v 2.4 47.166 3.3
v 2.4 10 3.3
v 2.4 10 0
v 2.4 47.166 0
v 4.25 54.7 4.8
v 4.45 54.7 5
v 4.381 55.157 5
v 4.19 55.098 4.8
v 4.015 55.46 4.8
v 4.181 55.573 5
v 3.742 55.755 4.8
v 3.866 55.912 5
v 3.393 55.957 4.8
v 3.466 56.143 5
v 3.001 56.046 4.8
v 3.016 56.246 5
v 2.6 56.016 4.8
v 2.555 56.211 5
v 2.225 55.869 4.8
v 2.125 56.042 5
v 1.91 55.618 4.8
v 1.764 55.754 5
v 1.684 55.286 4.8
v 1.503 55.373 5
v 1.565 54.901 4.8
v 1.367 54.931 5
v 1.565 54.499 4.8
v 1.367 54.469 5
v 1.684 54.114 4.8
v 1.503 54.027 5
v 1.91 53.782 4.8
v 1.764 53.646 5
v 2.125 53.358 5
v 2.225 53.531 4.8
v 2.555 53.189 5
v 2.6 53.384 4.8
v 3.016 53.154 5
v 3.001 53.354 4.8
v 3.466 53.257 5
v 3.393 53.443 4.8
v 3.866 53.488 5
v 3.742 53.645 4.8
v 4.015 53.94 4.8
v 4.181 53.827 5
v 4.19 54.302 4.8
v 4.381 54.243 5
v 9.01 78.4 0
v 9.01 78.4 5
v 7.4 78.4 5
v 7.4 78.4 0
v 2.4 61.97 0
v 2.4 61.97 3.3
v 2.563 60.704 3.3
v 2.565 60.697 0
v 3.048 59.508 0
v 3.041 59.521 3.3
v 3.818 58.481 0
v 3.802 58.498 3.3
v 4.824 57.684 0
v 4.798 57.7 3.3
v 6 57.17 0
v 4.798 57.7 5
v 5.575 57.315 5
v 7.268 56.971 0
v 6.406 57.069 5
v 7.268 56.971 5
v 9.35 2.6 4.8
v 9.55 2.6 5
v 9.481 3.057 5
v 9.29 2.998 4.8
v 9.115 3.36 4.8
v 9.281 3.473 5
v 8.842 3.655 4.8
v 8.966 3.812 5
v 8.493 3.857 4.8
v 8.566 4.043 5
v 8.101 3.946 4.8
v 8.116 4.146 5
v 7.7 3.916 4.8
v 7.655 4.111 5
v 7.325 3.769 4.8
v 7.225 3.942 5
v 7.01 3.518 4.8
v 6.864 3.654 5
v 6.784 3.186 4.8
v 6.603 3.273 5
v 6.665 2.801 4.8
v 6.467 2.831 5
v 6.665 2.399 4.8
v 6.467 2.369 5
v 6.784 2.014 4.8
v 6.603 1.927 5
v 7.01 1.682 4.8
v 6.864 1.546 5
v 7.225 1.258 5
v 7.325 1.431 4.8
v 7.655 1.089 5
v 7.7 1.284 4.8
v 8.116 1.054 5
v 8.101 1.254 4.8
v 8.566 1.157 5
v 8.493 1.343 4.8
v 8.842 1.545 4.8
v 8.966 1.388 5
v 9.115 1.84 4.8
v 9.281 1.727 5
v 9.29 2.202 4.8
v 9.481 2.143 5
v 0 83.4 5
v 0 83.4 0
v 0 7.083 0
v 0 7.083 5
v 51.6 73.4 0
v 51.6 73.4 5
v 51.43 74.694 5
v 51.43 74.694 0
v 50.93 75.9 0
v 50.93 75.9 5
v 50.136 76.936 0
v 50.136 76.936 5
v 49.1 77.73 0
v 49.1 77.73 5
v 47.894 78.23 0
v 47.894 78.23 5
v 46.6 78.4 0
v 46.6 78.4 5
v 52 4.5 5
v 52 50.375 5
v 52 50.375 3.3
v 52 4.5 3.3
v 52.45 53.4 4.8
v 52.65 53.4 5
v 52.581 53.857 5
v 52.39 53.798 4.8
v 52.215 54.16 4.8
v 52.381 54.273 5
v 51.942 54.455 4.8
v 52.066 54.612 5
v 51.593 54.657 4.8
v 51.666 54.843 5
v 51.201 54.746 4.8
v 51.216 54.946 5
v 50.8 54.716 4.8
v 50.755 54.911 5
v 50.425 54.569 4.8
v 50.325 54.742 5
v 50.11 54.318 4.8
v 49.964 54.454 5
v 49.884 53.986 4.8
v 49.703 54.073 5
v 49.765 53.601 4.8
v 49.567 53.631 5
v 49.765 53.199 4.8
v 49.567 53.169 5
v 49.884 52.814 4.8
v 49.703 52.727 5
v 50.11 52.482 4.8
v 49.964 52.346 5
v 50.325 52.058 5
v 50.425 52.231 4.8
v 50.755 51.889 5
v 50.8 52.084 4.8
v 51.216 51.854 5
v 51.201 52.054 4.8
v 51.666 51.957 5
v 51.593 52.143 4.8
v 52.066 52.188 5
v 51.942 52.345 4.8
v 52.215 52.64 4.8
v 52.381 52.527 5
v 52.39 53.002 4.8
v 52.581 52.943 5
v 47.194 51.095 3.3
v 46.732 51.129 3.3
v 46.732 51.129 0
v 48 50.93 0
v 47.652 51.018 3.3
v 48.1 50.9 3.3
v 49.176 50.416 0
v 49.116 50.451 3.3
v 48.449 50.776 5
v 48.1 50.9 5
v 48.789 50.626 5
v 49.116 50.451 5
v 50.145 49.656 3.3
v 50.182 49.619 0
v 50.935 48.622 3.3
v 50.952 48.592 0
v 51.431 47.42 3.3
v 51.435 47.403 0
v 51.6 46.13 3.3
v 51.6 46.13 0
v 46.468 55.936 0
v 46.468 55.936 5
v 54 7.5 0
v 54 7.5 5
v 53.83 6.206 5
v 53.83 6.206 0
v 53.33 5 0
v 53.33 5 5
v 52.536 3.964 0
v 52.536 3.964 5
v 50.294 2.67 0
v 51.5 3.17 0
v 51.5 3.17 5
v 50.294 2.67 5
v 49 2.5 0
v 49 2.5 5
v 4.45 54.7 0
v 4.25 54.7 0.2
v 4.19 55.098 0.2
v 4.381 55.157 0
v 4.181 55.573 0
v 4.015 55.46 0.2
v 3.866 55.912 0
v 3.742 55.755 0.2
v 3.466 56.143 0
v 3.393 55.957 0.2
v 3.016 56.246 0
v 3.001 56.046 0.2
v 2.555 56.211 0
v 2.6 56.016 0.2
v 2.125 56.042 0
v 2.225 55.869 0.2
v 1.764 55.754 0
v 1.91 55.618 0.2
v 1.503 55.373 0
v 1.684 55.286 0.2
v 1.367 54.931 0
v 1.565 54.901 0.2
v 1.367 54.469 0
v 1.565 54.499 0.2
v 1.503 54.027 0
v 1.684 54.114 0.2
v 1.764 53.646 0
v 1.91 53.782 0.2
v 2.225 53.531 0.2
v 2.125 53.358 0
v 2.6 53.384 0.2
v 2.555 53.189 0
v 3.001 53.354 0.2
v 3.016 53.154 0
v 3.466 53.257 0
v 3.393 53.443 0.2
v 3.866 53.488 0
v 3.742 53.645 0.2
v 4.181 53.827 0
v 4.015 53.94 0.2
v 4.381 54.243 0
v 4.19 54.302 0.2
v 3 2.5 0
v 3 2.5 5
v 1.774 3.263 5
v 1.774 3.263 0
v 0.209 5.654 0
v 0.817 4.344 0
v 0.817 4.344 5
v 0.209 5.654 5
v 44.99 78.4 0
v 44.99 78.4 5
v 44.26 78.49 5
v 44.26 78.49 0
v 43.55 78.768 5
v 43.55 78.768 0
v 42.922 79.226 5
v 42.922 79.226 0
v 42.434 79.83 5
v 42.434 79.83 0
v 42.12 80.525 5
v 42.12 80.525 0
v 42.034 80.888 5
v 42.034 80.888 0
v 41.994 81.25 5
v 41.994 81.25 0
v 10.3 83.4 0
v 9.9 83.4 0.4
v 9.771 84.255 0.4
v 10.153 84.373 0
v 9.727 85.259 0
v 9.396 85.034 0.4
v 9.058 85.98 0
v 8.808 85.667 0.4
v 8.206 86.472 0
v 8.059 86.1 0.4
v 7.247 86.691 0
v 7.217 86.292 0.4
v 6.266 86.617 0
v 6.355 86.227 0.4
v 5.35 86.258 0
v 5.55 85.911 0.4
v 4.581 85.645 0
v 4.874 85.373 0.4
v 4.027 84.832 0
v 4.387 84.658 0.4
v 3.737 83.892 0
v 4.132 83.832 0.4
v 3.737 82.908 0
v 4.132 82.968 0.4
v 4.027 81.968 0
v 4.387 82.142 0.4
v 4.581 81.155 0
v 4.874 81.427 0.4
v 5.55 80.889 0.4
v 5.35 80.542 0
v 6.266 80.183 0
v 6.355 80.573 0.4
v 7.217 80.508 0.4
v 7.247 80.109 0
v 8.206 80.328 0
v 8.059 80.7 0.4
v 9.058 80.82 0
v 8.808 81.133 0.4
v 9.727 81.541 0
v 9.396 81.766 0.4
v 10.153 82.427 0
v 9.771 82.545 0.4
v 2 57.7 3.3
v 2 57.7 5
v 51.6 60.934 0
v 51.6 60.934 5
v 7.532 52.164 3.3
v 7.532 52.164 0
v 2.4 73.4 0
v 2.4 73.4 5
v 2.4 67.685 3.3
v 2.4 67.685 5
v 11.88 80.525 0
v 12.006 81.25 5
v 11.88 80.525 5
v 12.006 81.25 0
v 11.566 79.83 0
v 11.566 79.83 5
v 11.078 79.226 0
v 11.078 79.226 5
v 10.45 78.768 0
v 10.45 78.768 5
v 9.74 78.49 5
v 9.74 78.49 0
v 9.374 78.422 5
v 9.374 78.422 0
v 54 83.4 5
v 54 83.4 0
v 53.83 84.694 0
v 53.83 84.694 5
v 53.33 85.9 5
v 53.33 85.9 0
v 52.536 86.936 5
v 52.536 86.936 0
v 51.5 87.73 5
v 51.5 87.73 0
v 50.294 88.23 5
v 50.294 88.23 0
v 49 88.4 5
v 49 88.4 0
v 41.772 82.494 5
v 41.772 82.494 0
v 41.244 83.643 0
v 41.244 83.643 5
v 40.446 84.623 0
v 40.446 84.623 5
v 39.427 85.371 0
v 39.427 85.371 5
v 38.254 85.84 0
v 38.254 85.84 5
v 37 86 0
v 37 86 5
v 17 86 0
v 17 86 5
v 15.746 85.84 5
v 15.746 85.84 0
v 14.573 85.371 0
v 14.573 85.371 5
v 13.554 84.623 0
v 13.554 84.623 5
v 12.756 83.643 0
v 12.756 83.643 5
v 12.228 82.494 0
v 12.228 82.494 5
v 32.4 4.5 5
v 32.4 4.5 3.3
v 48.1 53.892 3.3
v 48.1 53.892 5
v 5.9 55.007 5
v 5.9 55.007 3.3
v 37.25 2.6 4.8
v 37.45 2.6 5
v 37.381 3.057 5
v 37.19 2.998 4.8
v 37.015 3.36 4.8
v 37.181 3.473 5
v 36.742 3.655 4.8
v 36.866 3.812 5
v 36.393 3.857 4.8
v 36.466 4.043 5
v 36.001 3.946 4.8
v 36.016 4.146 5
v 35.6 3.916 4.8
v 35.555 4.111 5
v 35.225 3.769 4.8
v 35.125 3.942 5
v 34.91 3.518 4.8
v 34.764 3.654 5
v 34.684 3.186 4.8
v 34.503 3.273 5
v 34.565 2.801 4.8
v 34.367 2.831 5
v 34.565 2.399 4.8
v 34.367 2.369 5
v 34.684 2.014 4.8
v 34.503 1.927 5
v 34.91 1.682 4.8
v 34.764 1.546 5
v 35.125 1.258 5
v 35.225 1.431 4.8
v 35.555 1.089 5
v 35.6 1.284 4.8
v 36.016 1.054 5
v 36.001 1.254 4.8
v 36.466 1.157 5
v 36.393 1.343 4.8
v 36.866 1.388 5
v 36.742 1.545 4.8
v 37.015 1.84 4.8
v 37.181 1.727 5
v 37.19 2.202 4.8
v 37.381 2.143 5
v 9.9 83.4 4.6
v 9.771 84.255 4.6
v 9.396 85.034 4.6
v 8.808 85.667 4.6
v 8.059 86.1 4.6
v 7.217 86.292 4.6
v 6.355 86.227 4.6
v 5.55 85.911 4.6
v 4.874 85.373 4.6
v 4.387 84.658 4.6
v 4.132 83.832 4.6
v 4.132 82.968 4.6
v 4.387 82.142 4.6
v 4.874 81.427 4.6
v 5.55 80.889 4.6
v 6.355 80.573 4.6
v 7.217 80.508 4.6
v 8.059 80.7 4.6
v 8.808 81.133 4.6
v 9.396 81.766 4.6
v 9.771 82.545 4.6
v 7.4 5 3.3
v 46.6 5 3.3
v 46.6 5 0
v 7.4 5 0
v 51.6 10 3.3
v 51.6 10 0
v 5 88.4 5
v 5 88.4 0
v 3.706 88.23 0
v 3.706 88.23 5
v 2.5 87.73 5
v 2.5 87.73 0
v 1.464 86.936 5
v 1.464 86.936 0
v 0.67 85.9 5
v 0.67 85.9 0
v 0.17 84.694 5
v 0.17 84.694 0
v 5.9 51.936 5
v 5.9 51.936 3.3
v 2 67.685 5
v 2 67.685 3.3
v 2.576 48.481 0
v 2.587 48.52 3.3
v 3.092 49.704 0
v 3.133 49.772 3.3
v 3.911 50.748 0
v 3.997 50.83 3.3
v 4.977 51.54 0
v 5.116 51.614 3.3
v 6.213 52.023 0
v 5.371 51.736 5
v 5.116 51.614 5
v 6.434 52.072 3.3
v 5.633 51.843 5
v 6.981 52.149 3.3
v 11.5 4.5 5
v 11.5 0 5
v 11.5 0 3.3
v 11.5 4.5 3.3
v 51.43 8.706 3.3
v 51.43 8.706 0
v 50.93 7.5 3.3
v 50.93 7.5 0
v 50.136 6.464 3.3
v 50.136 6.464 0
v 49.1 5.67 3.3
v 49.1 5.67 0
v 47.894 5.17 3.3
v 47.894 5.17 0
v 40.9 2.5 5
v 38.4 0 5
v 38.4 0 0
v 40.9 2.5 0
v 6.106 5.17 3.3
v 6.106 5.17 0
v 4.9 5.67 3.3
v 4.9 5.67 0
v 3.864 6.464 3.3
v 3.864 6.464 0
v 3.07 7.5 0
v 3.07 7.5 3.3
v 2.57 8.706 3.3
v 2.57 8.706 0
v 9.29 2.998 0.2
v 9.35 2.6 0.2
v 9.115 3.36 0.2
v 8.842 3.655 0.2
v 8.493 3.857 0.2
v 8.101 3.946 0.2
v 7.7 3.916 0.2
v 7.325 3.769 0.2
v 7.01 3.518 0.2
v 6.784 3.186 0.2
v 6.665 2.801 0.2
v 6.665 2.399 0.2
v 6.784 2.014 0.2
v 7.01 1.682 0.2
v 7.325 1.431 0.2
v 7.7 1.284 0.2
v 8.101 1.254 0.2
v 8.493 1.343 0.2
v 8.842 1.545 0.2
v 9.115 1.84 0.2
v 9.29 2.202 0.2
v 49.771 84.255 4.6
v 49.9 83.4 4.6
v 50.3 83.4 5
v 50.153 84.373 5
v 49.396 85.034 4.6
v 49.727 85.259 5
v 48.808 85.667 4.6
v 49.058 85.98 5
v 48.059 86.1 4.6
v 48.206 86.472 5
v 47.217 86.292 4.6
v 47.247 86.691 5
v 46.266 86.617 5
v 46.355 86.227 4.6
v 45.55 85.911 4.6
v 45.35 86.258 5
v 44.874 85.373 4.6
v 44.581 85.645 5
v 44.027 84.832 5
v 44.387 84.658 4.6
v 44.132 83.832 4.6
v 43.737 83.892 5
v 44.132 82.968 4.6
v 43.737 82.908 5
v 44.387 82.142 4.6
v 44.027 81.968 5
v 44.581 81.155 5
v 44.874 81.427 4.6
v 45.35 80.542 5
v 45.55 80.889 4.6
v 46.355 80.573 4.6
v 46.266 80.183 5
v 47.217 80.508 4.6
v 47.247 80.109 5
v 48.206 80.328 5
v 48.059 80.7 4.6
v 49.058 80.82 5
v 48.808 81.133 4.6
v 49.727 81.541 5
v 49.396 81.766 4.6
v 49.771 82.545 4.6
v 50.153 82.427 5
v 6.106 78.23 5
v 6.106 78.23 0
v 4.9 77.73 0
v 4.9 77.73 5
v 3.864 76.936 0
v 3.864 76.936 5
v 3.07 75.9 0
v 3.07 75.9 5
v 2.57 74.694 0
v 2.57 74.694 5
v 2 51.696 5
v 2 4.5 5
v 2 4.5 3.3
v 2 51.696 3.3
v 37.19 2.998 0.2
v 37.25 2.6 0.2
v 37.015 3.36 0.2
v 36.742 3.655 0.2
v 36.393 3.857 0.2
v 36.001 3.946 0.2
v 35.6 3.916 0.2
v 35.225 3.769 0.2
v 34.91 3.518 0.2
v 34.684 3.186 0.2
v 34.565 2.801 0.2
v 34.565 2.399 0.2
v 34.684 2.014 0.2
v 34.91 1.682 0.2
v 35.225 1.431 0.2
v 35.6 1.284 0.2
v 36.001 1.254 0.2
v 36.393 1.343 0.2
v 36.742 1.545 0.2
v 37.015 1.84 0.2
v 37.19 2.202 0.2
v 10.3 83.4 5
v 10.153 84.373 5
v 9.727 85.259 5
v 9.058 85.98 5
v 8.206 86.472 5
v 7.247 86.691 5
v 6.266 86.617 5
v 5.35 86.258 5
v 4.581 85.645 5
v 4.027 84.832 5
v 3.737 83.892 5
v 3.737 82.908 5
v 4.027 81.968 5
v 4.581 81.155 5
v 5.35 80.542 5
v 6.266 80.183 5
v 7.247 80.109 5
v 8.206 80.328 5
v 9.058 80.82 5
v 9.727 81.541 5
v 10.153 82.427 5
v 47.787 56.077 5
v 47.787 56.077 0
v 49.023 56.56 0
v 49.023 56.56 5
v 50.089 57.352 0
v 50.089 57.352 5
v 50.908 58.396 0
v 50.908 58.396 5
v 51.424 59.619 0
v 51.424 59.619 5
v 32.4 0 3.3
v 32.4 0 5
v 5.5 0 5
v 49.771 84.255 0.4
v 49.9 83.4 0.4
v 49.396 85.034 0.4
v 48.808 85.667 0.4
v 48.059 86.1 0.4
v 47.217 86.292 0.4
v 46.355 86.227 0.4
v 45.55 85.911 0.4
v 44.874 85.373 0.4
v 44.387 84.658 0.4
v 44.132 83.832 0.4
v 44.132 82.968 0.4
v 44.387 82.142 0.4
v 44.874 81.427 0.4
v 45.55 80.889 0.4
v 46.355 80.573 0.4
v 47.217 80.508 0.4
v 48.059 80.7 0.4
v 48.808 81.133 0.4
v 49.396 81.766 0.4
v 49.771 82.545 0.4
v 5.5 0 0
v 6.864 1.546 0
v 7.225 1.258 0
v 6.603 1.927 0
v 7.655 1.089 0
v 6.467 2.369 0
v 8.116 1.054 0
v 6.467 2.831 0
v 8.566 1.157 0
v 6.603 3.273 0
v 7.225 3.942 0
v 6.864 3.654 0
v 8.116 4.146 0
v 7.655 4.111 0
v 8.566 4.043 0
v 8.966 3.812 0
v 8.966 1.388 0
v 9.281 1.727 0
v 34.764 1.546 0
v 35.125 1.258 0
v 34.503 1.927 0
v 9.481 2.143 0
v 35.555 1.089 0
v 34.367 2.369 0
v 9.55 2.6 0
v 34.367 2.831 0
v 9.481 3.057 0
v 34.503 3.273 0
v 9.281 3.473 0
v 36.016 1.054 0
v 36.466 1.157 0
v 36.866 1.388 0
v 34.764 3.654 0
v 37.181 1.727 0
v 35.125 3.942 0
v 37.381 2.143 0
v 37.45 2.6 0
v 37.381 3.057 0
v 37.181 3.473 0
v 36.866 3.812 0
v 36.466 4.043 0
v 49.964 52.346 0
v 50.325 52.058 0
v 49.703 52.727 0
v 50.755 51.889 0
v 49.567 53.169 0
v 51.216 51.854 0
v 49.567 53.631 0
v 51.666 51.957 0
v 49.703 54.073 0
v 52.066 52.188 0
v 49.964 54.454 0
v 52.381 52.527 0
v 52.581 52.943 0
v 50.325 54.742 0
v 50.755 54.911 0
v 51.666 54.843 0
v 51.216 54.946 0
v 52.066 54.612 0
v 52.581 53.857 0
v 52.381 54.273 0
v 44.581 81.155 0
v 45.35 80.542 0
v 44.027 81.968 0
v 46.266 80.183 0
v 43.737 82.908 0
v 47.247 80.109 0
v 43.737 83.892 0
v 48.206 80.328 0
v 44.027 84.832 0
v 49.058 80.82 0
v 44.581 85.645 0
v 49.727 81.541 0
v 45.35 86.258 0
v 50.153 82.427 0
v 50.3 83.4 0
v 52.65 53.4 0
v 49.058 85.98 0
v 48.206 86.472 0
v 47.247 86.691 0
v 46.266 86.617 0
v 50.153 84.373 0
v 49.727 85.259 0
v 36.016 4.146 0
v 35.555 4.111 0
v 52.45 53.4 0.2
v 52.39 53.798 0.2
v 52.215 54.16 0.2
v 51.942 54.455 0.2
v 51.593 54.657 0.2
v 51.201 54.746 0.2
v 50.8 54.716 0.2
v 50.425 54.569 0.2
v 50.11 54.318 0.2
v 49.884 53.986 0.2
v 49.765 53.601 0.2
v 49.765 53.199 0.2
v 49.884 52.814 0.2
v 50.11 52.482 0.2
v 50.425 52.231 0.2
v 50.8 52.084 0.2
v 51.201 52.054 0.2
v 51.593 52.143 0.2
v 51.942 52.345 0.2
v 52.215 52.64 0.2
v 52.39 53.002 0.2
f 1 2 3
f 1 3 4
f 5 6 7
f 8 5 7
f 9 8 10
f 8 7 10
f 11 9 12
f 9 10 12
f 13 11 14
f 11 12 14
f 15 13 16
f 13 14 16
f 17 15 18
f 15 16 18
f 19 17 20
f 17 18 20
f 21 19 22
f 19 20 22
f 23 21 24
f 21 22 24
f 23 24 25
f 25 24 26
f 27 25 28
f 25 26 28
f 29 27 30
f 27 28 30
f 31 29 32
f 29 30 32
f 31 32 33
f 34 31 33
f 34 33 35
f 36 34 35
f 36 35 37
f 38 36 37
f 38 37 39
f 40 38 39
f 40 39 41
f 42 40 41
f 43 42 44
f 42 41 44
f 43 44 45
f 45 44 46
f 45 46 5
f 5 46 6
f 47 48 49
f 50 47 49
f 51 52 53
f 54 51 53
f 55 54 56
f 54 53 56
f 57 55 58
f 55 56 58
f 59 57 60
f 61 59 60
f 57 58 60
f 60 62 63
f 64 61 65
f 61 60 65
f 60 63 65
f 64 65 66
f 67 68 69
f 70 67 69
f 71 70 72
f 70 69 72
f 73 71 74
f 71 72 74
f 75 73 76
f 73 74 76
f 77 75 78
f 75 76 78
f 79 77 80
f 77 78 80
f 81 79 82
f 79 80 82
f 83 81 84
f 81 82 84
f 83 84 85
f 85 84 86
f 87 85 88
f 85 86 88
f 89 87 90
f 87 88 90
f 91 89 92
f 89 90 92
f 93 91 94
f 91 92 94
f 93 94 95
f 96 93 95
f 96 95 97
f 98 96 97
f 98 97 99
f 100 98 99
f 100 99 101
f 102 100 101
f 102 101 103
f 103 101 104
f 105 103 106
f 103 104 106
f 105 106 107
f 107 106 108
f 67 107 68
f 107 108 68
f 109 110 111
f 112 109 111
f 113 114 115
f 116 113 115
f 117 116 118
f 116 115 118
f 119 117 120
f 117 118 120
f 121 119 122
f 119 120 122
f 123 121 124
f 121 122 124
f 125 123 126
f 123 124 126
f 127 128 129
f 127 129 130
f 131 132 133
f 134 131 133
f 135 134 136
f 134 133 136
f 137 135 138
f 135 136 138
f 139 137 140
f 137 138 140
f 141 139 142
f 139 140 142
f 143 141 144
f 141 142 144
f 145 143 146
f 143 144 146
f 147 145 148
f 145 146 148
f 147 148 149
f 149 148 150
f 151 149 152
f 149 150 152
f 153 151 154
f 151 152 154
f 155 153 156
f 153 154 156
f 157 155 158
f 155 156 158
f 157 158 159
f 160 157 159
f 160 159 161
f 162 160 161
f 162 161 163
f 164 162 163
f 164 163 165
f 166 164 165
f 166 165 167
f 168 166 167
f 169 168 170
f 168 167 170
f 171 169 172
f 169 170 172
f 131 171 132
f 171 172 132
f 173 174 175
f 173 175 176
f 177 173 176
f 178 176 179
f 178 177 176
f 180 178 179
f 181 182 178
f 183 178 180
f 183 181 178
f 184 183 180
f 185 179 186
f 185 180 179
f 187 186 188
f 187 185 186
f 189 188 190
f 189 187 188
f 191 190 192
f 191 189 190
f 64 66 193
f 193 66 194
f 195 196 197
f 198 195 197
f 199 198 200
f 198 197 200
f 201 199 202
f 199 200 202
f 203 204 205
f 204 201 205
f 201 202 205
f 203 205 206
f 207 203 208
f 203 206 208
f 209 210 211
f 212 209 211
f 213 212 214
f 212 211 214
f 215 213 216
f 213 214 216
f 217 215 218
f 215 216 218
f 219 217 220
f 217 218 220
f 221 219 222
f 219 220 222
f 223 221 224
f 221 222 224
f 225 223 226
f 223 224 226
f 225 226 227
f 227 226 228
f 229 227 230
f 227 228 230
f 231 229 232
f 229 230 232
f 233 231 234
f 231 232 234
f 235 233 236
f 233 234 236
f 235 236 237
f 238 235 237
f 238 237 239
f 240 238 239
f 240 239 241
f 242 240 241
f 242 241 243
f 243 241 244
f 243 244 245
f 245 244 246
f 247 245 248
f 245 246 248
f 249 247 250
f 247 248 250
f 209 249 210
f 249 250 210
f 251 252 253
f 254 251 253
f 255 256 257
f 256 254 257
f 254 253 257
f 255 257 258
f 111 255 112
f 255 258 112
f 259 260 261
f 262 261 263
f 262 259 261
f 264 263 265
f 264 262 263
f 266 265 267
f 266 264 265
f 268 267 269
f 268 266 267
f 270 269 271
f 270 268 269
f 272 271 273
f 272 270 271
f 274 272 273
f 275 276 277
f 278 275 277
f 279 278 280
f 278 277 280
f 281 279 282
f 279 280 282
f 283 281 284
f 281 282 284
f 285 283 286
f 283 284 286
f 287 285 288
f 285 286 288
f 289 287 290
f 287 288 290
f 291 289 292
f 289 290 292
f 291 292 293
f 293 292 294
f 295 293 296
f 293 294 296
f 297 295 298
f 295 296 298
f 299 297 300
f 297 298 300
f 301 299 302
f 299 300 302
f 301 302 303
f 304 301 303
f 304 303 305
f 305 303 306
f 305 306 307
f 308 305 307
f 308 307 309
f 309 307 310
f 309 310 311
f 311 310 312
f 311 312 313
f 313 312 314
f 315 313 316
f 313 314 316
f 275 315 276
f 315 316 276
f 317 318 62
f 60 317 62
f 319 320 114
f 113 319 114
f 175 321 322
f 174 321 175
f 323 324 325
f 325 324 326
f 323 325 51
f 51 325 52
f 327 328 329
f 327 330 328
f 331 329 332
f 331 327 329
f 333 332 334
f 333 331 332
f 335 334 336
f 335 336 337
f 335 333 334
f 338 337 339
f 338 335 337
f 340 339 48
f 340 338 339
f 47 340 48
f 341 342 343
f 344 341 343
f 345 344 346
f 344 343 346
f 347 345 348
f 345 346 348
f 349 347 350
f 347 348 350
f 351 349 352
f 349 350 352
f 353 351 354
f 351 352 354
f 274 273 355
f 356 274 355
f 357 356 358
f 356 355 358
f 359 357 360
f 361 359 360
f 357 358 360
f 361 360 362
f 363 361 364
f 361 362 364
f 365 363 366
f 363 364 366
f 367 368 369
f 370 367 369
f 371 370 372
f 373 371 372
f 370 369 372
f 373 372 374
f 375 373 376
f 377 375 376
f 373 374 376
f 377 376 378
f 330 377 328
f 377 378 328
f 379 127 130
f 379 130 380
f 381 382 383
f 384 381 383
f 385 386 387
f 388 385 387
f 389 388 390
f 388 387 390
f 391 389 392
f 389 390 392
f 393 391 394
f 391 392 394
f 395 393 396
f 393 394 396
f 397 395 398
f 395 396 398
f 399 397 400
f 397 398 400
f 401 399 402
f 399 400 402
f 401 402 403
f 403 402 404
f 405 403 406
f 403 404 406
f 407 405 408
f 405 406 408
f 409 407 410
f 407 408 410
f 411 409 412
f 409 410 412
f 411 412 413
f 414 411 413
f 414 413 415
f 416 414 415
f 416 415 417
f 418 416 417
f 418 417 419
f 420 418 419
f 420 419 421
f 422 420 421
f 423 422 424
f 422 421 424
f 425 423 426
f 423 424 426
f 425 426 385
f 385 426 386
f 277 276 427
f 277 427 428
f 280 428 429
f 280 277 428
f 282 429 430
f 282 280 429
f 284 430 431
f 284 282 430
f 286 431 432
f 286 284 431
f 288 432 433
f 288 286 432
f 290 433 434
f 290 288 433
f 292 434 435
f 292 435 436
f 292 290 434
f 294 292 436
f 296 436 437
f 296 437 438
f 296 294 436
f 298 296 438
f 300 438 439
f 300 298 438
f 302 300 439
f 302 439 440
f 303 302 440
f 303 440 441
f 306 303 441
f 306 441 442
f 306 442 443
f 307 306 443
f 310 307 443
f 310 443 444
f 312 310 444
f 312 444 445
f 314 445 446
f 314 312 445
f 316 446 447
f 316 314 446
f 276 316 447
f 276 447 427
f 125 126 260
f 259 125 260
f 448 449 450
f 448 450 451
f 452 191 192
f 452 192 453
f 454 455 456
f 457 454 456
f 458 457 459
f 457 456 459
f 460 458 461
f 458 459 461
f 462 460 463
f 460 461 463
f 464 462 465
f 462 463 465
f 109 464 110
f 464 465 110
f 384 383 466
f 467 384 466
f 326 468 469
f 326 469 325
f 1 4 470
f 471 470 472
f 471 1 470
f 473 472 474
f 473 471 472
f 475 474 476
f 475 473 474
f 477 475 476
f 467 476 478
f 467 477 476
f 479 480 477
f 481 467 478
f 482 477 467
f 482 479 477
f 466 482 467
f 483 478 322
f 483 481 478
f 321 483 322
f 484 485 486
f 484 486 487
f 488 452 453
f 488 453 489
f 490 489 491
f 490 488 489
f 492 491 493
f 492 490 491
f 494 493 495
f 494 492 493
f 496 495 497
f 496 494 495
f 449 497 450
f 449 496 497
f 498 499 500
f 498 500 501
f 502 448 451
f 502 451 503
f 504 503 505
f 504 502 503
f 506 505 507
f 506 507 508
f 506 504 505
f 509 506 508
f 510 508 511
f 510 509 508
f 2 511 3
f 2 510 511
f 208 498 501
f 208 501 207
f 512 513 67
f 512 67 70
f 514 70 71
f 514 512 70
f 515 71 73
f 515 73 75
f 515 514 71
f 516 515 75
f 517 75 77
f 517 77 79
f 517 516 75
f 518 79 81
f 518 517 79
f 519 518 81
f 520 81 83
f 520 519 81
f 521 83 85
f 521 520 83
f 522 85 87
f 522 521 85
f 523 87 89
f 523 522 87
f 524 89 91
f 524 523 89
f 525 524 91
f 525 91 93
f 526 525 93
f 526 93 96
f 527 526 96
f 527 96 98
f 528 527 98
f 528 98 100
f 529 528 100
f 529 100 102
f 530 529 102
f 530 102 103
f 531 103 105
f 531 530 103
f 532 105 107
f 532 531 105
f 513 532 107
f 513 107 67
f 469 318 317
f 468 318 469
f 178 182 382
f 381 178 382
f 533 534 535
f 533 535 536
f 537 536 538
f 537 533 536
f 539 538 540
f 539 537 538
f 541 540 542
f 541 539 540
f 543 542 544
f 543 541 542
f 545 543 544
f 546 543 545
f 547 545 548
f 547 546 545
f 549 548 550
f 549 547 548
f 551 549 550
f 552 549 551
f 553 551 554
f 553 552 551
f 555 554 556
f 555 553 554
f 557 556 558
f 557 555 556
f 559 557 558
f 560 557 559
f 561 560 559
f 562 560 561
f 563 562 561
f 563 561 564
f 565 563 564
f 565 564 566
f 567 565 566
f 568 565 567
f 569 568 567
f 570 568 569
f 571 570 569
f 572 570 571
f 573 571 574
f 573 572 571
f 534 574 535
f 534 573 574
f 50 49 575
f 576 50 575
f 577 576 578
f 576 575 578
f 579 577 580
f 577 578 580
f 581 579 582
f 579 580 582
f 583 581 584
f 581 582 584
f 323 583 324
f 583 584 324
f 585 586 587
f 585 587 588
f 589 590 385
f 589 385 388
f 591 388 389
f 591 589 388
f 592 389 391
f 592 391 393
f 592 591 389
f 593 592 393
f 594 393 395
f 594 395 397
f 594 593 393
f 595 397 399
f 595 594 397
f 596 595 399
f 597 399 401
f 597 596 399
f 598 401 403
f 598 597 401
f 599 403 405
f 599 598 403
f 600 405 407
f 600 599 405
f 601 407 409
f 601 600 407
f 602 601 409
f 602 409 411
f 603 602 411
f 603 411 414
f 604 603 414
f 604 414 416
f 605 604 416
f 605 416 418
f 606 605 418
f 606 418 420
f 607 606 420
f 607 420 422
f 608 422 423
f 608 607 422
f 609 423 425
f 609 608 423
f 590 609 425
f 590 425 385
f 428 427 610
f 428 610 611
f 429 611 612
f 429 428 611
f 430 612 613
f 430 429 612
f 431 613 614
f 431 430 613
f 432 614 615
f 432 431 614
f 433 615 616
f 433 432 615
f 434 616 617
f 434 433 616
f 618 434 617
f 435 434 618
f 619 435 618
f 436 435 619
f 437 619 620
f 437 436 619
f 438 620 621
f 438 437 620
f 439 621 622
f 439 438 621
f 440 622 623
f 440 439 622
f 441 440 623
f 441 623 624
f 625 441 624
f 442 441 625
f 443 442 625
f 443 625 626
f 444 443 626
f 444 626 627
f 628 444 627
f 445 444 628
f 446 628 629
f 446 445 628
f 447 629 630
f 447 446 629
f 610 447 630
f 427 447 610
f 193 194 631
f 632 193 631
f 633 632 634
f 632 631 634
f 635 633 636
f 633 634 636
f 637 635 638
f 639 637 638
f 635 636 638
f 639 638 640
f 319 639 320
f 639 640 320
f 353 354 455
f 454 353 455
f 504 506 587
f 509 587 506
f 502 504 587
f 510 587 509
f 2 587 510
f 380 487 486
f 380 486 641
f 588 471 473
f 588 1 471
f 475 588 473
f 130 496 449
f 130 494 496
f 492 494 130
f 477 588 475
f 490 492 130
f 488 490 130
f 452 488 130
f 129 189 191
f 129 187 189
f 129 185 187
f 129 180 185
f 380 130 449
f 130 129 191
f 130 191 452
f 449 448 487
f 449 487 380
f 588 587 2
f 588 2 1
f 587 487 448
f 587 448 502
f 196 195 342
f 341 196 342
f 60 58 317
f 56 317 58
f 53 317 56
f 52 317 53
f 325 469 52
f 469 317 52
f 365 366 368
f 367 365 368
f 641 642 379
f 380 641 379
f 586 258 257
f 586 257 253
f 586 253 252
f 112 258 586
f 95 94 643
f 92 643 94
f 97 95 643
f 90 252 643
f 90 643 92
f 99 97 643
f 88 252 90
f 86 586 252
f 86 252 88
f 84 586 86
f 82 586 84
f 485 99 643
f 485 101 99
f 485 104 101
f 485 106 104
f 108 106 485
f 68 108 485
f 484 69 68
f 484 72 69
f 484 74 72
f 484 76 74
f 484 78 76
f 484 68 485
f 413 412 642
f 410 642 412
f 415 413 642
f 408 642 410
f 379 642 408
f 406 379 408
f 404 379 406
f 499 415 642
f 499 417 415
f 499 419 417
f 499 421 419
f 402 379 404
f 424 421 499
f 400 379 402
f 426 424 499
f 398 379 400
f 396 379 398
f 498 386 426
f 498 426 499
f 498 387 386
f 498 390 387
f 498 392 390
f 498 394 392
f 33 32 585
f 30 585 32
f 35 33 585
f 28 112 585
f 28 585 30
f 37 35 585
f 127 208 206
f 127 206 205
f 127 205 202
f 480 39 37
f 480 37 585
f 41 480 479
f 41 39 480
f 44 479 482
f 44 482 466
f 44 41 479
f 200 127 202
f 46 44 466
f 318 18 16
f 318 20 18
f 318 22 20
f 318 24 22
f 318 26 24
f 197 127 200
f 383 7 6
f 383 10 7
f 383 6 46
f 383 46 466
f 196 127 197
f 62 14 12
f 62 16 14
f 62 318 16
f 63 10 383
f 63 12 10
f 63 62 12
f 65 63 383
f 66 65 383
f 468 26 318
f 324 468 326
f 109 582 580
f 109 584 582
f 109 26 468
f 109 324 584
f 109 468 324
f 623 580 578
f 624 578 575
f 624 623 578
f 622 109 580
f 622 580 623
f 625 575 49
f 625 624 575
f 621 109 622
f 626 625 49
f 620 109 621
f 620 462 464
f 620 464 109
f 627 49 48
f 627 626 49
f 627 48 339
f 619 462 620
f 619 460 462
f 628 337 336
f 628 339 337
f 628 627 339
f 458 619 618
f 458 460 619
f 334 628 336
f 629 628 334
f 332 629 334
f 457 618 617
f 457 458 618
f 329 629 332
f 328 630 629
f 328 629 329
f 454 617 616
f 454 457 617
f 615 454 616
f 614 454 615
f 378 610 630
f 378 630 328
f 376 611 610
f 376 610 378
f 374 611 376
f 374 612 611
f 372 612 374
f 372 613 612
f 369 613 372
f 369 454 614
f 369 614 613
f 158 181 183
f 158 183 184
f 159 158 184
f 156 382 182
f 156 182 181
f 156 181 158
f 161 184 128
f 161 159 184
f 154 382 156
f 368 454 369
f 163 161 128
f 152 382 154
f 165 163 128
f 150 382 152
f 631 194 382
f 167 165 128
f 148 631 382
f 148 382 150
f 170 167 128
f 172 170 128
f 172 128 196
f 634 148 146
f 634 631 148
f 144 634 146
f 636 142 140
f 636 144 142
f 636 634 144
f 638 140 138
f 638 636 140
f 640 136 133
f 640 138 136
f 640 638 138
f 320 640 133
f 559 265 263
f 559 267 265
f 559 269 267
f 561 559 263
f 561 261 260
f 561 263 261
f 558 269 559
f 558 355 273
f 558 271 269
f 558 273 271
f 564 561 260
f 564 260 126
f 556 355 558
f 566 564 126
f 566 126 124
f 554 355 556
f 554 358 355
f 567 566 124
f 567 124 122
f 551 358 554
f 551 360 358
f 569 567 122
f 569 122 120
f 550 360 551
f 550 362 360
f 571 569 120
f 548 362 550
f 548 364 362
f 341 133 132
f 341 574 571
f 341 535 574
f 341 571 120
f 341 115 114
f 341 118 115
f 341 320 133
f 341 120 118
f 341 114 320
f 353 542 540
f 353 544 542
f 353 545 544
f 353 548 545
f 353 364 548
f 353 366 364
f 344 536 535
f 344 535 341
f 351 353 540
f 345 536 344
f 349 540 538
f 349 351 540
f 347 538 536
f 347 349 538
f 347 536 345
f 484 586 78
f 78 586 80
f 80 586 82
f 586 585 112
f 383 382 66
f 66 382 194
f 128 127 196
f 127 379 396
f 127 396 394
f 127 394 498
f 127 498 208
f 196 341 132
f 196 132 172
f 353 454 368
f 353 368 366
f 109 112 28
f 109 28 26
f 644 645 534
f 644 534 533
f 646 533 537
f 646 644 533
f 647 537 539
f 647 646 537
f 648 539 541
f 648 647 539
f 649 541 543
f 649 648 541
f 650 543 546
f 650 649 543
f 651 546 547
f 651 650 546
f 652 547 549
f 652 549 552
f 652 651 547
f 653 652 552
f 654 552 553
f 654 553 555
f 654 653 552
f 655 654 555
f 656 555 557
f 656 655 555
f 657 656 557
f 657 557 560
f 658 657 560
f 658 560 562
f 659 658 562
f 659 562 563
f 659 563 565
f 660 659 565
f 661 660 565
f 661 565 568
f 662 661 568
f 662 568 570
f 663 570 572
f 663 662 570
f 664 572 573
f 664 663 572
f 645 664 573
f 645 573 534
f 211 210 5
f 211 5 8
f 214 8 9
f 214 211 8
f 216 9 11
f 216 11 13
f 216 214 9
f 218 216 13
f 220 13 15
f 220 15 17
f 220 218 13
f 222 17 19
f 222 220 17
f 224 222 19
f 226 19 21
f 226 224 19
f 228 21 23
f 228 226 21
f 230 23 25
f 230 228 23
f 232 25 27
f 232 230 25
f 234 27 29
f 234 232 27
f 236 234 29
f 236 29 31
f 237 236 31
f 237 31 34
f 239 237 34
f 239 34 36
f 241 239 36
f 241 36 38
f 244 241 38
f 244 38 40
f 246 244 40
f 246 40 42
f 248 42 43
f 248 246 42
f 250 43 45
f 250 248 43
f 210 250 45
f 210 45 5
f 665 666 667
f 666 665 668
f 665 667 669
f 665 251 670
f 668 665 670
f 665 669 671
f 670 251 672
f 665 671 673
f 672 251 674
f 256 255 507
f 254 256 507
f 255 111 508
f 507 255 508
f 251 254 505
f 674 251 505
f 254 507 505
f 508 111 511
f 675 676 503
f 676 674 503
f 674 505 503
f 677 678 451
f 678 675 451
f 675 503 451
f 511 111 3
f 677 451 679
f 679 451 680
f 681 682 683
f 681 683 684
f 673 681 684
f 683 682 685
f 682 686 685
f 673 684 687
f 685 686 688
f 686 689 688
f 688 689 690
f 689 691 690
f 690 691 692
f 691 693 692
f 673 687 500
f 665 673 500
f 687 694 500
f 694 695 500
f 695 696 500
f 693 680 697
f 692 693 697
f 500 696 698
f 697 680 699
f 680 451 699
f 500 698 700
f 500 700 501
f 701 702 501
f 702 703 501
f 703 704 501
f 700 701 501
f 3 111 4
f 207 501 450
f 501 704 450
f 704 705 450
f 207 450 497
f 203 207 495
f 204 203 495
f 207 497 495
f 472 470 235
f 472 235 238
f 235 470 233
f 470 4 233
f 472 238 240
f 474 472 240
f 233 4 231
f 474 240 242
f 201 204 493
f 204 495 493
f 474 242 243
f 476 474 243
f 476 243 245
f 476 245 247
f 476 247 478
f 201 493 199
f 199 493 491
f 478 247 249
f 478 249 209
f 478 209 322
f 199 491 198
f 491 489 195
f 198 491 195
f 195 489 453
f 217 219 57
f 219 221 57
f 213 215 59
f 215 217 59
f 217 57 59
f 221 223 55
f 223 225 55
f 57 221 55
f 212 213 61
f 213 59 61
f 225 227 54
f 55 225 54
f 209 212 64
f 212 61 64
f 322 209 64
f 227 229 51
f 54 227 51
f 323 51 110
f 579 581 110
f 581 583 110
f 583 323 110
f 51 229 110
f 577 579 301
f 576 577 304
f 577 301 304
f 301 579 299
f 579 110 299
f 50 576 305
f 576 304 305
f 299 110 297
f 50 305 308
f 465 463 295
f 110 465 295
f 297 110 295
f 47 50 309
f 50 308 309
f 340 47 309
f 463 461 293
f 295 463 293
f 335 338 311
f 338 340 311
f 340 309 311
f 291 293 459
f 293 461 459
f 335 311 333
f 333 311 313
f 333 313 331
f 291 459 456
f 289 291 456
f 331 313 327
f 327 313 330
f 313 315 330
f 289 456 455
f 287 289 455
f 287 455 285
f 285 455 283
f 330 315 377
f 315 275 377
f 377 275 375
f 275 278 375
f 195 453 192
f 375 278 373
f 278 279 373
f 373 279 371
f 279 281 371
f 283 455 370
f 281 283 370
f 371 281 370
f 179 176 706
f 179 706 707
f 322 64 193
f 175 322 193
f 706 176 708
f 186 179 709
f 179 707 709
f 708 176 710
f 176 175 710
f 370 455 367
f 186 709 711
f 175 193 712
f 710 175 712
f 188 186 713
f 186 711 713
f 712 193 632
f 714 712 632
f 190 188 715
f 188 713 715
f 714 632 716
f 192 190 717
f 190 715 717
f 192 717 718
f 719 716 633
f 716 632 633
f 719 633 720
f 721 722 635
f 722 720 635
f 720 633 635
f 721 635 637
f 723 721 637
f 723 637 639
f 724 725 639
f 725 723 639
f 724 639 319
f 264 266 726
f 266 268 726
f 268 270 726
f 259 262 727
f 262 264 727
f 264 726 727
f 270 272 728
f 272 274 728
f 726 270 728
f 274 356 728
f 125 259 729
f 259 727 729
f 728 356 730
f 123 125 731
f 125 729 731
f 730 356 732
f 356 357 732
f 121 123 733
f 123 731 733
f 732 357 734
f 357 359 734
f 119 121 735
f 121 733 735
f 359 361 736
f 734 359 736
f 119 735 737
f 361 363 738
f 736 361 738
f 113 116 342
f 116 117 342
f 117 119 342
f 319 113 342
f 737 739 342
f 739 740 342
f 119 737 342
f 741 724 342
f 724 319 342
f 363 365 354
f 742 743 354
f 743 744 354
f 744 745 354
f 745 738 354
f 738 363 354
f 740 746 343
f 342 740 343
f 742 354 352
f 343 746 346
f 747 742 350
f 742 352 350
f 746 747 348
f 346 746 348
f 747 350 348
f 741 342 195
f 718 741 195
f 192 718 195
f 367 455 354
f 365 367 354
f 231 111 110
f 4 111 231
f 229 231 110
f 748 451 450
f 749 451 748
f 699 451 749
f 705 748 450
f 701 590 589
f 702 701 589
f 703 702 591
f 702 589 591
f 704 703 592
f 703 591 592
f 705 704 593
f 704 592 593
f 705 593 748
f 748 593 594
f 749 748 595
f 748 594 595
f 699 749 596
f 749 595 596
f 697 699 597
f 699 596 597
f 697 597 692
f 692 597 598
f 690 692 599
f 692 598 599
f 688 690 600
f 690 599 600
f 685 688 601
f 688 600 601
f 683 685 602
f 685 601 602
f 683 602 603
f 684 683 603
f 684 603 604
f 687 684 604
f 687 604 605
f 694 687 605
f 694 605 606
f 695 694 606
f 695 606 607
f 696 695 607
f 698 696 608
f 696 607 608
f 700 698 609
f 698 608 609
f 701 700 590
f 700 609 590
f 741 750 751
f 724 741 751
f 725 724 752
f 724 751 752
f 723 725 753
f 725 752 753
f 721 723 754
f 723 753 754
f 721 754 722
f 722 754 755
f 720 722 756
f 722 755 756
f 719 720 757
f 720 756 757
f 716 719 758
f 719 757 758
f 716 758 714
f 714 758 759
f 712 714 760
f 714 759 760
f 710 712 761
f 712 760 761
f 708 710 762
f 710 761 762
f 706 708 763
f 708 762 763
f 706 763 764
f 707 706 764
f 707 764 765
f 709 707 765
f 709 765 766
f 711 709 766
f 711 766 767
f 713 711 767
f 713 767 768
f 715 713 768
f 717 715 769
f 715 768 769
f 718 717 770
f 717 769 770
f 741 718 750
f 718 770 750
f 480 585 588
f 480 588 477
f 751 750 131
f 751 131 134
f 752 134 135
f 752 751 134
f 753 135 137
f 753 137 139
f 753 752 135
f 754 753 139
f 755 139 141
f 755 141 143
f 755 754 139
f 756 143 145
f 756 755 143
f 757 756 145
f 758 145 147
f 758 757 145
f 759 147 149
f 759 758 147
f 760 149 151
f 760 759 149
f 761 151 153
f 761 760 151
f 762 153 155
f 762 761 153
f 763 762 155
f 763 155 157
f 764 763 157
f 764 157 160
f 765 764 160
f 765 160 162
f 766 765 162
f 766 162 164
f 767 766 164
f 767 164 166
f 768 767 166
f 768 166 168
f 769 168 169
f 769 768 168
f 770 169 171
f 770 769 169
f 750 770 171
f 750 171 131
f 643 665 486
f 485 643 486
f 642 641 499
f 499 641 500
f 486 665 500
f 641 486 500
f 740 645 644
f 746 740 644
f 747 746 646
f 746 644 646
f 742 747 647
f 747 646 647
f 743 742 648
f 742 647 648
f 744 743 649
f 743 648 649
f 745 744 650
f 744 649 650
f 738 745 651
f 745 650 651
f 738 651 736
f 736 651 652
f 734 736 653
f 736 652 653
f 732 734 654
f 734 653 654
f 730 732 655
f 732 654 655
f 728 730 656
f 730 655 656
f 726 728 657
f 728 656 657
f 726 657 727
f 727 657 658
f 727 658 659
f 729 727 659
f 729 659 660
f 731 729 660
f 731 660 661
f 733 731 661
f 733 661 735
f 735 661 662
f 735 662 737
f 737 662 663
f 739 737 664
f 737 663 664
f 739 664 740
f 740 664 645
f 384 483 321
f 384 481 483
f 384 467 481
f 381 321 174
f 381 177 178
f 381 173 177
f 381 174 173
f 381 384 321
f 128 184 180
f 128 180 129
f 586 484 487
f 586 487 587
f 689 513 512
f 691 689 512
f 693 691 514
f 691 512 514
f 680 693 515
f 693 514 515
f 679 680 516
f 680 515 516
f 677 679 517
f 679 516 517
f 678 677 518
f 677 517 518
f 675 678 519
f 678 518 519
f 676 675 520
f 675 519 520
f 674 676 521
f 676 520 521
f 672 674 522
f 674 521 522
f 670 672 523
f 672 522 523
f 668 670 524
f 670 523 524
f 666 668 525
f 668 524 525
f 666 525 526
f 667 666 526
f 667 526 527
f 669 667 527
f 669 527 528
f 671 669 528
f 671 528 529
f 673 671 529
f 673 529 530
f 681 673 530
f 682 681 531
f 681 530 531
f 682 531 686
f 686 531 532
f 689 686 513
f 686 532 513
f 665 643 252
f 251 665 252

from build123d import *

# Parameters (mm, degrees)
SKETCH1_R           = 2.9
SKETCH1_R_2         = 1.35
BOSS_EXTRUDE1_DEPTH = 5
CUT_EXTRUDE1_DEPTH  = 5
CUT_EXTRUDE2_DEPTH  = 5
CHAMFER1_SIZE       = 0.4
CHAMFER2_SIZE       = 0.2
FILLET1_R           = 3
FILLET2_R           = 5
SKETCH4_W           = 20.9
SKETCH4_H           = 5
CUT_EXTRUDE3_DEPTH  = 1.7
SKETCH5_W           = 8
SKETCH5_H           = 9.98481564
CUT_EXTRUDE5_DEPTH  = 1.7
CUT_EXTRUDE6_DEPTH  = 1.7


with BuildPart() as part:
    # Sketch1 → Boss-Extrude1 (new body)
    with BuildSketch(Plane.XY):
        with BuildLine():
            Line((0, 0), (54, 0))
            Line((54, 0), (54, 83.4))
            ThreePointArc((54, 83.4), (52.535533906, 86.935533906), (49, 88.4))
            Line((49, 88.4), (5, 88.4))
            ThreePointArc((5, 88.4), (1.464466094, 86.935533906), (0, 83.4))
            Line((0, 83.4), (0, 0))
        make_face()
        with Locations((7, 83.4)):
            Circle(SKETCH1_R, mode=Mode.SUBTRACT)
        with Locations((47, 83.4)):
            Circle(SKETCH1_R, mode=Mode.SUBTRACT)
        with Locations((2.9, 54.7)):
            Circle(SKETCH1_R_2, mode=Mode.SUBTRACT)
        with Locations((51.1, 53.4)):
            Circle(SKETCH1_R_2, mode=Mode.SUBTRACT)
        with Locations((8, 2.6)):
            Circle(SKETCH1_R_2, mode=Mode.SUBTRACT)
        with Locations((35.9, 2.6)):
            Circle(SKETCH1_R_2, mode=Mode.SUBTRACT)
    extrude(amount=BOSS_EXTRUDE1_DEPTH)

    # Sketch2 → Cut-Extrude1 (cut)
    with BuildSketch(Plane.XY.offset(5)):
        Polygon((5.5, 0), (3, 2.5), (0, 2.5), (0, 0), align=None)
        Polygon((38.4, 0), (40.9, 2.5), (54, 2.5), (54, 0), align=None)
    extrude(amount=-CUT_EXTRUDE1_DEPTH, mode=Mode.SUBTRACT)

    # Sketch3 → Cut-Extrude2 (cut)
    with BuildSketch(Plane.XY.offset(5)):
        with BuildLine():
            Line((12, 81), (12, 78.4))
            Line((12, 78.4), (7.4, 78.4))
            ThreePointArc((7.4, 78.4), (3.864466094, 76.935533906), (2.4, 73.4))
            Line((2.4, 73.4), (2.4, 61.96963128))
            ThreePointArc((2.4, 61.96963128), (3.818077427, 58.48110284), (7.267932273, 56.971375773))
            Line((7.267932273, 56.971375773), (46.467932273, 55.935603416))
            ThreePointArc((46.467932273, 55.935603416), (50.088528441, 57.35193635), (51.6, 60.933858923))
            Line((51.6, 60.933858923), (51.6, 73.4))
            ThreePointArc((51.6, 73.4), (50.135533906, 76.935533906), (46.6, 78.4))
            Line((46.6, 78.4), (42, 78.4))
            Line((42, 78.4), (42, 81))
            ThreePointArc((42, 81), (40.535533906, 84.535533906), (37, 86))
            Line((37, 86), (17, 86))
            ThreePointArc((17, 86), (13.464466094, 84.535533906), (12, 81))
        make_face()
        with BuildLine():
            Line((7.532067727, 52.164396584), (46.732067727, 51.128624227))
            ThreePointArc((46.732067727, 51.128624227), (50.181922573, 49.61889716), (51.6, 46.13036872))
            Line((51.6, 46.13036872), (51.6, 10))
            ThreePointArc((51.6, 10), (50.135533906, 6.464466094), (46.6, 5))
            Line((46.6, 5), (7.4, 5))
            ThreePointArc((7.4, 5), (3.864466094, 6.464466094), (2.4, 10))
            Line((2.4, 10), (2.4, 47.166141077))
            ThreePointArc((2.4, 47.166141077), (3.911471559, 50.74806365), (7.532067727, 52.164396584))
        make_face()
    extrude(amount=-CUT_EXTRUDE2_DEPTH, mode=Mode.SUBTRACT)

    # Chamfer1
    chamfer1_edges = [part.edges().sort_by_distance(p)[0] for p in [
        (4.1, 83.4, 0),
        (4.1, 83.4, 5),
        (44.1, 83.4, 0),
        (44.1, 83.4, 5),
    ]]
    chamfer(chamfer1_edges, length=CHAMFER1_SIZE)

    # Chamfer2
    chamfer2_edges = [part.edges().sort_by_distance(p)[0] for p in [
        (1.55, 54.7, 0),
        (1.55, 54.7, 5),
        (49.75, 53.4, 0),
        (49.75, 53.4, 5),
        (6.65, 2.6, 0),
        (6.65, 2.6, 5),
        (34.55, 2.6, 0),
        (34.55, 2.6, 5),
    ]]
    chamfer(chamfer2_edges, length=CHAMFER2_SIZE)

    # Fillet1
    fillet1_edges = [part.edges().sort_by_distance(p)[0] for p in [
        (42, 78.4, 2.5),
        (12, 78.4, 2.5),
    ]]
    fillet(fillet1_edges, radius=FILLET1_R)

    # Fillet2
    # the kernel refuses this fillet: 5 mm, written as the material it takes off along each edge
    with BuildSketch(Plane(origin=(0, 2.5, 16.456439237), x_dir=(0, 1, 0), z_dir=(0, 0, -1))) as fillet2_piece_1:
        with BuildLine():
            CenterArc((4.582575695, 5), FILLET2_R, 203.578178478, 66.421821522)
            Line((0, 3), (-0.091651514, 2.96))
            ThreePointArc((-0.091651514, 2.96), (-0.1, 1.5), (-0.1, 0))
            Line((-0.1, 0), (0, -0.1))
            Line((0, -0.1), (4.582575695, -0.1))
            Line((4.582575695, -0.1), (4.582575695, 0))
        make_face()
    extrude(amount=27.912878475, mode=Mode.SUBTRACT)
    with BuildSketch(Plane(origin=(54, 2.5, 17.5), x_dir=(0, 1, 0), z_dir=(0, 0, -1))) as fillet2_piece_2:
        with BuildLine():
            CenterArc((FILLET2_R, -FILLET2_R), FILLET2_R, 90, 90)
            Line((0, -FILLET2_R), (-FILLET2_R * 0.02, -FILLET2_R))
            Line((-FILLET2_R * 0.02, -FILLET2_R), (-FILLET2_R * 0.02, FILLET2_R * 0.02))
            Line((-FILLET2_R * 0.02, FILLET2_R * 0.02), (FILLET2_R, FILLET2_R * 0.02))
            Line((FILLET2_R, FILLET2_R * 0.02), (FILLET2_R, 0))
        make_face()
    extrude(amount=30, mode=Mode.SUBTRACT)

    # Sketch4 → Cut-Extrude3 (cut)
    with BuildSketch(Plane.XY.offset(5)):
        with Locations((21.95, 2.5)):
            Rectangle(SKETCH4_W, SKETCH4_H)
    extrude(amount=-CUT_EXTRUDE3_DEPTH, mode=Mode.SUBTRACT)

    # Sketch5 → Cut-Extrude5 (cut)
    with BuildSketch(Plane.XY.offset(5)):
        Polygon((2, 51.696310663), (52, 50.375172451), (52, 4.5), (2, 4.5), align=None)
        with Locations((6, 62.69240782)):
            Rectangle(SKETCH5_W, SKETCH5_H)
    extrude(amount=-CUT_EXTRUDE5_DEPTH, mode=Mode.SUBTRACT)

    # Sketch6 → Cut-Extrude6 (cut)
    with BuildSketch(Plane.XY.offset(5)):
        Polygon((48.1, 53.891781634), (5.9, 55.006822285), (5.9, 50.553811317), (48.1, 49.438770667), align=None)
    extrude(amount=-CUT_EXTRUDE6_DEPTH, mode=Mode.SUBTRACT)


solid = part.part
